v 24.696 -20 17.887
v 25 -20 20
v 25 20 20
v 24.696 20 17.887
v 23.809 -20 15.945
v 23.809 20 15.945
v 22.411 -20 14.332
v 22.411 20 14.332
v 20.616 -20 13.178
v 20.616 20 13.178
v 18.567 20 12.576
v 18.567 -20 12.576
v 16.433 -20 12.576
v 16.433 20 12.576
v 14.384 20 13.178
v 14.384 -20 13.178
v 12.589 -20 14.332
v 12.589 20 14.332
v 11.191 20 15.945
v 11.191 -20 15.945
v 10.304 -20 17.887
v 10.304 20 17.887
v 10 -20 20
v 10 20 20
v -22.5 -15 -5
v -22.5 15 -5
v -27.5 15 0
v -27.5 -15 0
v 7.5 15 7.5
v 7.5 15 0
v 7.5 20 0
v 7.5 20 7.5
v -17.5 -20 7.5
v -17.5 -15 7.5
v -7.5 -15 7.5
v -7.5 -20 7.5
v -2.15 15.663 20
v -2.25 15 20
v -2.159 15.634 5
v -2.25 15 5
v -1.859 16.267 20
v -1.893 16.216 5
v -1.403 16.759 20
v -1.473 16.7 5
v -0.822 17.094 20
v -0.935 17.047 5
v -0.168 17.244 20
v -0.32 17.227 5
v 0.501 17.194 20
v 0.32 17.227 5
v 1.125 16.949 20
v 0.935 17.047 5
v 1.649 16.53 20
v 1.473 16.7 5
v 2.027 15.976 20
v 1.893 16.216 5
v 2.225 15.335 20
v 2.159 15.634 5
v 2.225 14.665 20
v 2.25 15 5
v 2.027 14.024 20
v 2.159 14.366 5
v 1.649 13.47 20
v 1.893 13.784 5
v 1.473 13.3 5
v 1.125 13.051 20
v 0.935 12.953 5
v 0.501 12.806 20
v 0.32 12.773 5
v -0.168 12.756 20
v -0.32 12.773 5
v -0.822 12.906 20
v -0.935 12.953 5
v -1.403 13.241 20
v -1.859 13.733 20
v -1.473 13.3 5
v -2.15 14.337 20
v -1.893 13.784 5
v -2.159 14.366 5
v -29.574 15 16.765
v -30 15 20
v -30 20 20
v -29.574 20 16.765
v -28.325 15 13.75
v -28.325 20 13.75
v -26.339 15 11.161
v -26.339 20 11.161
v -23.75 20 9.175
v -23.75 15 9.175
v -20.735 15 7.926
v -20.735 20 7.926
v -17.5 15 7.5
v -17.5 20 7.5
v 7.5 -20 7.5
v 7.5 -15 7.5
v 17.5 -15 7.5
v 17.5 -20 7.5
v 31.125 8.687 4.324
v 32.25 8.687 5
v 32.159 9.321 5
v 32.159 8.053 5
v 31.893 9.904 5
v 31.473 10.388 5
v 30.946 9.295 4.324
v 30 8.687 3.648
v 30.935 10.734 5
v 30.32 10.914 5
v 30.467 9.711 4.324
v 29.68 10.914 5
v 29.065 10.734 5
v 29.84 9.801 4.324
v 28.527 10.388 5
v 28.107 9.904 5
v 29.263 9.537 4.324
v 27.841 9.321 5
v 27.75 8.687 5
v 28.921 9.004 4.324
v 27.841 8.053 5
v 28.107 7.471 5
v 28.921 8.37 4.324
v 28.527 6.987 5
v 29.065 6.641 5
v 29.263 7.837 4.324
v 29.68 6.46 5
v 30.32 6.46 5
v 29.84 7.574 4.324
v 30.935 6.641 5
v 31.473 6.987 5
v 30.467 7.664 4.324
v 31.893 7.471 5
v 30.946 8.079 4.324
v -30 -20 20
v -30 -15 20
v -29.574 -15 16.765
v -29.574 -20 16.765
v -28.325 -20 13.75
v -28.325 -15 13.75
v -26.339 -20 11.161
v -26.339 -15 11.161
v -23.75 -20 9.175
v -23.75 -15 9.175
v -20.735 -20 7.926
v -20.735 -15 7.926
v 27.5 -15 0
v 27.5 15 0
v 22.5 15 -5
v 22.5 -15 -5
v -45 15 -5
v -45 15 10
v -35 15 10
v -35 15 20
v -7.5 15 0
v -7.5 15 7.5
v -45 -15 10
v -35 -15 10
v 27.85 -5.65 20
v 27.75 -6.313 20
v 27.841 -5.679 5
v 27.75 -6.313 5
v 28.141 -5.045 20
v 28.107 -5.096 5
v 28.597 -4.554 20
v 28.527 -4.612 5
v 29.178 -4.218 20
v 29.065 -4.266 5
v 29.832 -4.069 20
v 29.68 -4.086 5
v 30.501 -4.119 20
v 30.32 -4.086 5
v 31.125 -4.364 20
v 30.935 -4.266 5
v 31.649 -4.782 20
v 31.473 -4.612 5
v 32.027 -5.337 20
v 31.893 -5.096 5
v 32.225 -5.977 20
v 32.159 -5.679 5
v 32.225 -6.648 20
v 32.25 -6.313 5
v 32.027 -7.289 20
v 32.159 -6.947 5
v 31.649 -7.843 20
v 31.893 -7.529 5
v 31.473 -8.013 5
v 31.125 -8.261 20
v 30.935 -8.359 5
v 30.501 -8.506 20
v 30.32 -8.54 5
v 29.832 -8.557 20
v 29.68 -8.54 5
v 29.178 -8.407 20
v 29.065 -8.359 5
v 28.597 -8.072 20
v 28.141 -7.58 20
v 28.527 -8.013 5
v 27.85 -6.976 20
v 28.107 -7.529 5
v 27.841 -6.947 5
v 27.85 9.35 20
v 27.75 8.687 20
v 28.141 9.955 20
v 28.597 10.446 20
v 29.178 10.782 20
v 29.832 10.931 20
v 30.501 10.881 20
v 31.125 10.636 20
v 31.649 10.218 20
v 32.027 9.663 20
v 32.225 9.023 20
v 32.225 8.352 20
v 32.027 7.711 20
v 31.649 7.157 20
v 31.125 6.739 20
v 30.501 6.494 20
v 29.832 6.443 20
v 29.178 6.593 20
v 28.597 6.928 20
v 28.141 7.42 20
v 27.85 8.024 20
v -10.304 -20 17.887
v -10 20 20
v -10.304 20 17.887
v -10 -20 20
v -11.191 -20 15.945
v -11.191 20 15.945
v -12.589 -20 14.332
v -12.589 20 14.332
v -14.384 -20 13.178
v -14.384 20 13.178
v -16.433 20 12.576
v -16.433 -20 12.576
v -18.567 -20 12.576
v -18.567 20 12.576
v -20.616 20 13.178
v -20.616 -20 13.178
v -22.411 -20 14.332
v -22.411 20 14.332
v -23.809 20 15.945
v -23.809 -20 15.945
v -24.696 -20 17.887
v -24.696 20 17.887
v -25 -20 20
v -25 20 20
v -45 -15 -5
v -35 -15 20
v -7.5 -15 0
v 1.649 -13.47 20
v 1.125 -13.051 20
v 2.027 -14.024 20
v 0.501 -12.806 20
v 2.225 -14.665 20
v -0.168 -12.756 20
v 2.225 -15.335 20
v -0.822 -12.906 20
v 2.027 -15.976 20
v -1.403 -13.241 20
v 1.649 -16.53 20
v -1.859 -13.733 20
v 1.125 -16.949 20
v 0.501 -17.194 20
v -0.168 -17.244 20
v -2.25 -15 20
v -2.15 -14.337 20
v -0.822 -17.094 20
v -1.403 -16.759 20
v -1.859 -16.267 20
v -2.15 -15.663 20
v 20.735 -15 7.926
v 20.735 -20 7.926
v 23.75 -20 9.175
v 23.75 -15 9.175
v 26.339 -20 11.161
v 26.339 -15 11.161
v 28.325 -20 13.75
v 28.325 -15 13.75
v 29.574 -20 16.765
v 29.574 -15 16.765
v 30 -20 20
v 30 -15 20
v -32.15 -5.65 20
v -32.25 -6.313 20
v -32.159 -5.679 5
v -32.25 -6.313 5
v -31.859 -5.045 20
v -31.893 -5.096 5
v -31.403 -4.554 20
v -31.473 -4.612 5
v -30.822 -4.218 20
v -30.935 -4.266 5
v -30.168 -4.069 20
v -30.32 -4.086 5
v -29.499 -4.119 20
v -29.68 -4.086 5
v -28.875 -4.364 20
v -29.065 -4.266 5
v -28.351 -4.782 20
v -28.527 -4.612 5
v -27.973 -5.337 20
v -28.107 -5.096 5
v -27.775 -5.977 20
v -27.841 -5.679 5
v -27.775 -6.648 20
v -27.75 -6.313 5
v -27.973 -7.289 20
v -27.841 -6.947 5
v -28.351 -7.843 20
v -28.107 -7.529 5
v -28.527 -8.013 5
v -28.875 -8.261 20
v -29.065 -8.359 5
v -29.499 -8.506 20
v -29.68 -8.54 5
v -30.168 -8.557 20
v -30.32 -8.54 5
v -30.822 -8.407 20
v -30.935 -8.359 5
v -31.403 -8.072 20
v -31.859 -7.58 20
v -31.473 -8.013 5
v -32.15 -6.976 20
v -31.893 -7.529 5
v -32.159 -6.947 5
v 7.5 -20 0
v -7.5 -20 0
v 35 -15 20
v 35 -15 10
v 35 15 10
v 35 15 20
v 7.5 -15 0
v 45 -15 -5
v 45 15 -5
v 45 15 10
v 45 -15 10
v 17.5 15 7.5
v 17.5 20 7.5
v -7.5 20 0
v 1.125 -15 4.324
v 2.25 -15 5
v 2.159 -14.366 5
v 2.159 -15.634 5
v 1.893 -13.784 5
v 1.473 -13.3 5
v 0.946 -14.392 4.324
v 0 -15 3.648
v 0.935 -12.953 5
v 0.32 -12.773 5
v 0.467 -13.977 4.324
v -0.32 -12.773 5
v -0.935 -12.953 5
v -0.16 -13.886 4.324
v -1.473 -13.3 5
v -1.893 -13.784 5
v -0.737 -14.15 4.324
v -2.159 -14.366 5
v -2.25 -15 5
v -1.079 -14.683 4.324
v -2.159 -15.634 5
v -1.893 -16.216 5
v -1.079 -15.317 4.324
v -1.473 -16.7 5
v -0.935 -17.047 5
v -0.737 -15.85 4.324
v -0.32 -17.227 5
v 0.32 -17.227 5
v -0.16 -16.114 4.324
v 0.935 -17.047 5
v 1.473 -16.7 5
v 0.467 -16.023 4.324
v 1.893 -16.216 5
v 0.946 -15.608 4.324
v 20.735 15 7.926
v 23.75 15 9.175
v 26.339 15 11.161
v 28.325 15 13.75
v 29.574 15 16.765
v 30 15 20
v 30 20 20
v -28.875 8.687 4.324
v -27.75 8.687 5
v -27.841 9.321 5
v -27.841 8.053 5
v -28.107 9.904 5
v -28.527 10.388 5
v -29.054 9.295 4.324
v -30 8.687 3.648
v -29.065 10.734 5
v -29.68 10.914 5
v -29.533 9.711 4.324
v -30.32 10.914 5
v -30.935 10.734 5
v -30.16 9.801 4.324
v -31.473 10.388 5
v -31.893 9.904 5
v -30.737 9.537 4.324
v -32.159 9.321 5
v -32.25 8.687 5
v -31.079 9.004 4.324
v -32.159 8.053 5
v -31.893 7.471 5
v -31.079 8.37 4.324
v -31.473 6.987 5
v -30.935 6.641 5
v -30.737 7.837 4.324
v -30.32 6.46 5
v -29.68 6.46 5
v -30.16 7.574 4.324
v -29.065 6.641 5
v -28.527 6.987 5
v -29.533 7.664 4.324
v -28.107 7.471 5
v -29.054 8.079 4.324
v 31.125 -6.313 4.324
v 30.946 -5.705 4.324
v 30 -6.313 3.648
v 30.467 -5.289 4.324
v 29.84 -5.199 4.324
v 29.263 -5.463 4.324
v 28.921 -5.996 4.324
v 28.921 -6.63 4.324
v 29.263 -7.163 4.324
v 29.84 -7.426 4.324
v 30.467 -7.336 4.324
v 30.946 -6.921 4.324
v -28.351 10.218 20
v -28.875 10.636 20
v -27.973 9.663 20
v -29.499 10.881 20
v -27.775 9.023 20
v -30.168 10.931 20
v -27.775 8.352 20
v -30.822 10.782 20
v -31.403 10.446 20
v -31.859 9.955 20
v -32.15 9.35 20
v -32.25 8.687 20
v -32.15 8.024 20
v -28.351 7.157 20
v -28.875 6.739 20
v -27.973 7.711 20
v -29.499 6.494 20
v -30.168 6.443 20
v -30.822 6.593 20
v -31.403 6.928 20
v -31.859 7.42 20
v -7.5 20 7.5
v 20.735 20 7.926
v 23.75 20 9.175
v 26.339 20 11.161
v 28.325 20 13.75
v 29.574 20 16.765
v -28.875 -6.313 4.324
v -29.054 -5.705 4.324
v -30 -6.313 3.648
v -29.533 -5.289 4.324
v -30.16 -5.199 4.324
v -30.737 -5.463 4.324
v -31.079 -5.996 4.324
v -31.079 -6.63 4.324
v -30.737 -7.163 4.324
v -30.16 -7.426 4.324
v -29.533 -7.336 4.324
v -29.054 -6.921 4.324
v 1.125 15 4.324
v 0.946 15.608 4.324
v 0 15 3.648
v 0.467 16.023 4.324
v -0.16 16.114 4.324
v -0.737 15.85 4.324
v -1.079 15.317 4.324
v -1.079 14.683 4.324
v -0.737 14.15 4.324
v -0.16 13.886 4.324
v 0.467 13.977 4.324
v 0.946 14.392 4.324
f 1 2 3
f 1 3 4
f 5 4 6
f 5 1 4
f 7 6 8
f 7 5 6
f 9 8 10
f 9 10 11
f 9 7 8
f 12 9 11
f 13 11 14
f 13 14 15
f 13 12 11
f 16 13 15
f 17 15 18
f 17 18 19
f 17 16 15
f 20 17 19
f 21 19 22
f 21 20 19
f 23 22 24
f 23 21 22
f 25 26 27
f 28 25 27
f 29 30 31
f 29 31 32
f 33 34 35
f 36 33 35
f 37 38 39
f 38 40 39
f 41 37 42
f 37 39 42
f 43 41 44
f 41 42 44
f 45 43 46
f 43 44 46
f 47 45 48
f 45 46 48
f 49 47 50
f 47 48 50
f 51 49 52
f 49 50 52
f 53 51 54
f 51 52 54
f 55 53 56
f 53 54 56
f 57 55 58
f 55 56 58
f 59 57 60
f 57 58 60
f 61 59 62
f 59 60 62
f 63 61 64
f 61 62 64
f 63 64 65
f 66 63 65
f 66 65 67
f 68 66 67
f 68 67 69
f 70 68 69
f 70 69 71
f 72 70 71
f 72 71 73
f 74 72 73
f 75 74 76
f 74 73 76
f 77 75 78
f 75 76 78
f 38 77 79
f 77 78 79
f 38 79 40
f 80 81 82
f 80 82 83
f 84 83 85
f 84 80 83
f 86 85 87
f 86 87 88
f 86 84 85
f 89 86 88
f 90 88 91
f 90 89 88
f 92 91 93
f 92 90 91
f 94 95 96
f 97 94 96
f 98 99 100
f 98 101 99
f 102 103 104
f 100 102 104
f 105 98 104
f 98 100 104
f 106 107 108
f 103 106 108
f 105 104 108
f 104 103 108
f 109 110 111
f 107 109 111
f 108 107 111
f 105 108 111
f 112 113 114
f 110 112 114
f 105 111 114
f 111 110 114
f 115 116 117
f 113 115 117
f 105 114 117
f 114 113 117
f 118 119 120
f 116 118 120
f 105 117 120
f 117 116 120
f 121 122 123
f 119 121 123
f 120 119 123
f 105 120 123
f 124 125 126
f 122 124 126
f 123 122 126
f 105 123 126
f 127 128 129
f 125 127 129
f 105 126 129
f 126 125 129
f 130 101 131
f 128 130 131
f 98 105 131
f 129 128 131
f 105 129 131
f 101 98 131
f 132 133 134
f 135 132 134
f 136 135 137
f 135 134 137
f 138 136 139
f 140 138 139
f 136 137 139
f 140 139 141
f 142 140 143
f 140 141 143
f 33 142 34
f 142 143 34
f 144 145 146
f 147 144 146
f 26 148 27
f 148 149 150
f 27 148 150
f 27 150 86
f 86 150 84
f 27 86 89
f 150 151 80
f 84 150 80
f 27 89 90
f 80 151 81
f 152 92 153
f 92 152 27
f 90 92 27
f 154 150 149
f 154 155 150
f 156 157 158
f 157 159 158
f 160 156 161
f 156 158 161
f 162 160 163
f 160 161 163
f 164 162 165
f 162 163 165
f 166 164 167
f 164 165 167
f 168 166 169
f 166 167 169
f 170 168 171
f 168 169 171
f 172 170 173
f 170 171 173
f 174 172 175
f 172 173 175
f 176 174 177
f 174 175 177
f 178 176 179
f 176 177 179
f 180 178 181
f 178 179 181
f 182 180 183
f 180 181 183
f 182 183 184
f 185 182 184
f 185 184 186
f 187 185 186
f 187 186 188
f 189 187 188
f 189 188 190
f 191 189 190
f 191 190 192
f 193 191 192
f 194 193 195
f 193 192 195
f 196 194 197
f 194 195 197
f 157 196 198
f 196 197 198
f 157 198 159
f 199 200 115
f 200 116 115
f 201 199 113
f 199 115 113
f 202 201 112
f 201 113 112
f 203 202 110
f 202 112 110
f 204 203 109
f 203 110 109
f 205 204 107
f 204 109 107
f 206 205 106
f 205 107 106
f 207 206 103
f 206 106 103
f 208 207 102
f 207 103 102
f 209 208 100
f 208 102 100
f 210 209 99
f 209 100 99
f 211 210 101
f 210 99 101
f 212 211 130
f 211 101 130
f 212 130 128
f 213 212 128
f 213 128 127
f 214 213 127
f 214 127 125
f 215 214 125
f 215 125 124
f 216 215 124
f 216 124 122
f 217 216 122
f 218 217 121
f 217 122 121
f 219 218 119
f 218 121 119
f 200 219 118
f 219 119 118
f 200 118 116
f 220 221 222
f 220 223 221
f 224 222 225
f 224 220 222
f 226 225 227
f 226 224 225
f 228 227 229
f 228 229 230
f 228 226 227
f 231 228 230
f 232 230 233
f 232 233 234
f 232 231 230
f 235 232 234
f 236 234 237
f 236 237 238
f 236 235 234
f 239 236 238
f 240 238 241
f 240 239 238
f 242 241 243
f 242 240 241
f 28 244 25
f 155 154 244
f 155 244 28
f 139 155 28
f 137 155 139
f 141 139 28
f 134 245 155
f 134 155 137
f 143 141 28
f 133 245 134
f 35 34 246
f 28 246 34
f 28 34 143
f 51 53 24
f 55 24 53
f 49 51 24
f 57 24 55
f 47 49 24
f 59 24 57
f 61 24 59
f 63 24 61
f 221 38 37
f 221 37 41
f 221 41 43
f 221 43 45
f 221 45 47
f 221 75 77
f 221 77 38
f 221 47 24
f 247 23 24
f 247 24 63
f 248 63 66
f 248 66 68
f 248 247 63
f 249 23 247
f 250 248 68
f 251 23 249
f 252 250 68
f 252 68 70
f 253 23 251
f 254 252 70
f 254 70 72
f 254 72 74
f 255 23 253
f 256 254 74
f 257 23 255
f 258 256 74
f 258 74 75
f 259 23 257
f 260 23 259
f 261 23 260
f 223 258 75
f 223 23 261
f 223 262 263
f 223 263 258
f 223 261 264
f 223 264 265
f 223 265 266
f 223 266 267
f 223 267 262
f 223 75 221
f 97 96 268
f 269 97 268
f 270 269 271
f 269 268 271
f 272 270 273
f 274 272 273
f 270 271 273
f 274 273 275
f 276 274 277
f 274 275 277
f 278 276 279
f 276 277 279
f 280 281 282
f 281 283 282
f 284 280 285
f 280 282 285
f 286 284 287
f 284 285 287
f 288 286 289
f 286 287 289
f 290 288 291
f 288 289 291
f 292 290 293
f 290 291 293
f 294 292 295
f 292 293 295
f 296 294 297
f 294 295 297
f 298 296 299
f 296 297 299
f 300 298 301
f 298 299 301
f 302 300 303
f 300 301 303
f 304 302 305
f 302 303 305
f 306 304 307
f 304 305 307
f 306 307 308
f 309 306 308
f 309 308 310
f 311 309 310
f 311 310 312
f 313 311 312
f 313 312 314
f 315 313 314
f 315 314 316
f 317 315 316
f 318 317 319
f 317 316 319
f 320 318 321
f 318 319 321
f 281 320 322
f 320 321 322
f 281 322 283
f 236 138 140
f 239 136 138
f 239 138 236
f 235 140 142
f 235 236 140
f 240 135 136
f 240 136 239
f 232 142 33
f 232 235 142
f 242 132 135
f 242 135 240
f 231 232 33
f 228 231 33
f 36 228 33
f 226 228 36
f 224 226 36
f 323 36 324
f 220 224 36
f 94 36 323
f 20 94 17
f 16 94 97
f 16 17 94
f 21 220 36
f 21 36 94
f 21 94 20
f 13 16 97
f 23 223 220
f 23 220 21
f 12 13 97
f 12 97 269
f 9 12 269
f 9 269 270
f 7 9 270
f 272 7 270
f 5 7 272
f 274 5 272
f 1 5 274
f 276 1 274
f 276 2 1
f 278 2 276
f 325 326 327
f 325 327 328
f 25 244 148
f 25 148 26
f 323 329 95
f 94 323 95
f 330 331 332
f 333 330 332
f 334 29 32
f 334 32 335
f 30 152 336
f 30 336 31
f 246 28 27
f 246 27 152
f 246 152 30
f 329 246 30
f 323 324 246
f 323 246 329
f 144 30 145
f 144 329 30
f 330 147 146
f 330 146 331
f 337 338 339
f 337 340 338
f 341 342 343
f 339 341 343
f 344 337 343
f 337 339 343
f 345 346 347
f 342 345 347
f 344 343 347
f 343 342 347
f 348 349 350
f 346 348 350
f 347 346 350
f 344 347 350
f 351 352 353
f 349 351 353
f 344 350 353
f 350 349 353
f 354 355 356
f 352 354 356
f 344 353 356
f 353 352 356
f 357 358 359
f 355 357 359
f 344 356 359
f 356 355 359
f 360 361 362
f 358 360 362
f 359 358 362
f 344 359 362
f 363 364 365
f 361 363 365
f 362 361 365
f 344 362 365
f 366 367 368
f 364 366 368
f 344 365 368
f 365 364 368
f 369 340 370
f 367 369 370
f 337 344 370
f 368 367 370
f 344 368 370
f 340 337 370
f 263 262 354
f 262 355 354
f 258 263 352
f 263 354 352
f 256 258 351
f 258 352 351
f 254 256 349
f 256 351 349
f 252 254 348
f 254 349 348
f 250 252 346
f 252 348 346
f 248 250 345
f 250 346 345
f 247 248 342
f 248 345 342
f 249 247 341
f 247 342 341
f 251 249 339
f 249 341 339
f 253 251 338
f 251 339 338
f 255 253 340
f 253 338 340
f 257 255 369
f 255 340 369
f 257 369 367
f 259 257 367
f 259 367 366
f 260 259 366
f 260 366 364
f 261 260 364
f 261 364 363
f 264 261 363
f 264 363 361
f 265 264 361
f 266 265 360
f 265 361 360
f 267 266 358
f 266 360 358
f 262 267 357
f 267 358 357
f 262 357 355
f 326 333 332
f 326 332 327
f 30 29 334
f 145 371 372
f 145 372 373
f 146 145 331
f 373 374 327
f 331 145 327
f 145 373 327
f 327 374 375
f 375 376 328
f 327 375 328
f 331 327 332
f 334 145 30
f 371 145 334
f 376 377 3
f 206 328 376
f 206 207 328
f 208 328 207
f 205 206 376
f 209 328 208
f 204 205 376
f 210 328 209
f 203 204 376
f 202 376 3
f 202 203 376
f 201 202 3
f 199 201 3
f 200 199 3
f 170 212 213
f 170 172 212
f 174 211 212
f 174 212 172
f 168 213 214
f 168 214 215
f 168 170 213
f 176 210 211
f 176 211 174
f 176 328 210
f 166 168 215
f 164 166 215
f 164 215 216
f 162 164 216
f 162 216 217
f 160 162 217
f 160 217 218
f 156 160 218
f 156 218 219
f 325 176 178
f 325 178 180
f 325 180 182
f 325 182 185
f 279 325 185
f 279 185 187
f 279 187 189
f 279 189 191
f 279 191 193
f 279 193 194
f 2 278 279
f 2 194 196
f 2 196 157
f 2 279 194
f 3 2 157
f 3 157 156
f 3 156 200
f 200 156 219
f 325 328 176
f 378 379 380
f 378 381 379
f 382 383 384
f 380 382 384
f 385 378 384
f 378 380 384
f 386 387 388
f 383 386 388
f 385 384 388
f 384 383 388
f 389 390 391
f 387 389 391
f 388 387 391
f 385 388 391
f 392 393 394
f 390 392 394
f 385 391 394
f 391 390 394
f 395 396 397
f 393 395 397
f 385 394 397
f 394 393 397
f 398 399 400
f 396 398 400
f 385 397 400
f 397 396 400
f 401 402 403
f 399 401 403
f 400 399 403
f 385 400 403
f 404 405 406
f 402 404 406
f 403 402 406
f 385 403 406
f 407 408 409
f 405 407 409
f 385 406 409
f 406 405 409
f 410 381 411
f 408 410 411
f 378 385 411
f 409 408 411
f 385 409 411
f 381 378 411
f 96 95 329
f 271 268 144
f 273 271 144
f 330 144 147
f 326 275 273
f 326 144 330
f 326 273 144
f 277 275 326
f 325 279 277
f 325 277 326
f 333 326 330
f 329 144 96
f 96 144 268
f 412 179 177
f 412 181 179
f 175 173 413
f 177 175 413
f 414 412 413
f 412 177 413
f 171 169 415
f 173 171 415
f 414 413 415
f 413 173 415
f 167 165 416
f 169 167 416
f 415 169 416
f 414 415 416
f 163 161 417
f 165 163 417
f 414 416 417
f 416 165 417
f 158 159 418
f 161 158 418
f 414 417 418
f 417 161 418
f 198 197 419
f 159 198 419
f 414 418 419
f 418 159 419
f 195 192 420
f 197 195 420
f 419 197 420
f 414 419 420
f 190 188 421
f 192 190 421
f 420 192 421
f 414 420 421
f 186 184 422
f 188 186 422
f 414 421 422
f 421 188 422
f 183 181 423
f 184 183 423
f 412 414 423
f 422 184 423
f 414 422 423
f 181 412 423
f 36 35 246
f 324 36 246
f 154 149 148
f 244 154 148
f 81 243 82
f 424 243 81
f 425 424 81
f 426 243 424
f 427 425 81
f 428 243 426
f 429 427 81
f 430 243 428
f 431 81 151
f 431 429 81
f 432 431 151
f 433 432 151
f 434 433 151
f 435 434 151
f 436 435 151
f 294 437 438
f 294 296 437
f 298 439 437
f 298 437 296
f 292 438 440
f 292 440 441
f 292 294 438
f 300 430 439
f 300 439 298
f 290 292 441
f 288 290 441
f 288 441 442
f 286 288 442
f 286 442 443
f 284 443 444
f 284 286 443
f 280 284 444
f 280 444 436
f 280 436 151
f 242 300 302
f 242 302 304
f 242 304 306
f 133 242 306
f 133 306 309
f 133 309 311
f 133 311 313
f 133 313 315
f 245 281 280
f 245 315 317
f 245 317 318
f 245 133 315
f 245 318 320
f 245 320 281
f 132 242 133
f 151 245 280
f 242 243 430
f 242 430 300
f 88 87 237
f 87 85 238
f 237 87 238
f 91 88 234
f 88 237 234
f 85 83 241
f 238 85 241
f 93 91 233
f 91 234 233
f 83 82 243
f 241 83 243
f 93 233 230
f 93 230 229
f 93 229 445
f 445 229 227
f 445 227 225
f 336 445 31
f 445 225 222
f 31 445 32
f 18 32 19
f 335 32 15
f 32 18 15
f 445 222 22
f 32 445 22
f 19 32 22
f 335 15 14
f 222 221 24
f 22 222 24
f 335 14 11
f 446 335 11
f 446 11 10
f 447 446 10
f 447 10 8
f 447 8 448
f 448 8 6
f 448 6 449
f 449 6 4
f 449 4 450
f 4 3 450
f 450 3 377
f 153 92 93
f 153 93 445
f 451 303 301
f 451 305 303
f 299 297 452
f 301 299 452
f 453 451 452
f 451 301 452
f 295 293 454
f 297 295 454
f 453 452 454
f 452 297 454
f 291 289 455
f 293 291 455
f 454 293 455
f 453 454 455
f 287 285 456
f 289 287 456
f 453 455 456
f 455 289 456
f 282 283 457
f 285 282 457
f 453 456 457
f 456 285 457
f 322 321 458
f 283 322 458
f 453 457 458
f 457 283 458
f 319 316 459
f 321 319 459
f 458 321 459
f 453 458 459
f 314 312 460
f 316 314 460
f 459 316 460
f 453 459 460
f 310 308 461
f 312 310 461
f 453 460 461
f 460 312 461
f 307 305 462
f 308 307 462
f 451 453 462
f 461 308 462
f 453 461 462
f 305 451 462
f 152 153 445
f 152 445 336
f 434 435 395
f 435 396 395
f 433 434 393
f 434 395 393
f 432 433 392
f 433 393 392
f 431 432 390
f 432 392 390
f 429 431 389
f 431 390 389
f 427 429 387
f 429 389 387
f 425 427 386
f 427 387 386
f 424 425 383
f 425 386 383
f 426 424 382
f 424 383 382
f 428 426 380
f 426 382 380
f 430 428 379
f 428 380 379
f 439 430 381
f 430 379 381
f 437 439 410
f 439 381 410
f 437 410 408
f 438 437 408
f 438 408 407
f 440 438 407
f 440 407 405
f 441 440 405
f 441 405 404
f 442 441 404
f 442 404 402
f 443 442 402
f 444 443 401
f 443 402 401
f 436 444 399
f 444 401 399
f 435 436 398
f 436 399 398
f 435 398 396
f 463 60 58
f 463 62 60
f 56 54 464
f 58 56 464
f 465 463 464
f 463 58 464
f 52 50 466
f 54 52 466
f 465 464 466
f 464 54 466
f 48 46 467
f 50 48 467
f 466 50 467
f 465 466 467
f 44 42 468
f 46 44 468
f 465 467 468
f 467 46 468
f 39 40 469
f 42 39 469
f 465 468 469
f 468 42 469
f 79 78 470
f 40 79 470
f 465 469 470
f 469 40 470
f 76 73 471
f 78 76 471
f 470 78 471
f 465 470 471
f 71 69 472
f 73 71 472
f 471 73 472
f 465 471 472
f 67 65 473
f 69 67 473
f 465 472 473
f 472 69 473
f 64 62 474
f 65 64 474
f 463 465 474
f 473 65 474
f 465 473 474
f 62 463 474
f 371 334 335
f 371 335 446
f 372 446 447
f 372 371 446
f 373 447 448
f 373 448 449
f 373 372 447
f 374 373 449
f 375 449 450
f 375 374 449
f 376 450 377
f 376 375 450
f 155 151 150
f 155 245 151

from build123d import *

# Parameters (mm, degrees)
F1_DEPTH = 15
F3_DEPTH = 5
F6_D     = 4.5
F6_DEPTH = 15
F6_TIP   = 1.3519363928


with BuildPart() as f1:
    # F0 (on Front) → F1 (new body, symmetric)
    with BuildSketch(Plane.XZ):
        with BuildLine():
            Line((-45, 10), (-45, -5))
            Line((-45, -5), (-22.5, -5))
            Line((-22.5, -5), (-27.5, 0))
            Line((-27.5, 0), (27.5, 0))
            Line((27.5, 0), (22.5, -5))
            Line((22.5, -5), (45, -5))
            Line((45, -5), (45, 10))
            Line((45, 10), (35, 10))
            Line((35, 10), (35, 20))
            Line((35, 20), (25, 20))
            ThreePointArc((25, 20), (17.5, 12.5), (10, 20))
            Line((10, 20), (-10, 20))
            ThreePointArc((-10, 20), (-17.5, 12.5), (-25, 20))
            Line((-25, 20), (-35, 20))
            Line((-35, 20), (-35, 10))
            Line((-35, 10), (-45, 10))
        make_face()
    extrude(amount=F1_DEPTH, both=True)

    # F2 (on face) → F3 (join)
    with BuildSketch(Plane.XZ.offset(15)):
        with BuildLine():
            Line((-25, 20), (-30, 20))
            ThreePointArc((-30, 20), (-26.3388347648, 11.1611652352), (-17.5, 7.5))
            Line((-17.5, 7.5), (-7.5, 7.5))
            Line((-7.5, 7.5), (-7.5, 0))
            Line((-7.5, 0), (7.5, 0))
            Line((7.5, 0), (7.5, 7.5))
            Line((7.5, 7.5), (17.5, 7.5))
            ThreePointArc((17.5, 7.5), (26.3388347648, 11.1611652352), (30, 20))
            Line((30, 20), (25, 20))
            ThreePointArc((25, 20), (17.5, 12.5), (10, 20))
            Line((10, 20), (-10, 20))
            ThreePointArc((-10, 20), (-17.5, 12.5), (-25, 20))
        make_face()
    extrude(amount=F3_DEPTH)

    # F4: F1 across plane


with BuildPart() as f1_1:
    add(f1.part)
    add(f1.part.mirror(Plane.XZ))

    # F6
    with Locations(Plane.XY.offset(20)):
        with Locations((-30, 8.6871764955), (-30, -6.3128235045), (0, 15), (0, -15), (30, 8.6871764955), (30, -6.3128235045)):
            Hole(F6_D / 2, depth=F6_DEPTH)
            with Locations((0, 0, -(F6_DEPTH + F6_TIP / 2))):  # 118° drill point
                Cone(0, F6_D / 2, F6_TIP, mode=Mode.SUBTRACT)


solid = f1_1.part
